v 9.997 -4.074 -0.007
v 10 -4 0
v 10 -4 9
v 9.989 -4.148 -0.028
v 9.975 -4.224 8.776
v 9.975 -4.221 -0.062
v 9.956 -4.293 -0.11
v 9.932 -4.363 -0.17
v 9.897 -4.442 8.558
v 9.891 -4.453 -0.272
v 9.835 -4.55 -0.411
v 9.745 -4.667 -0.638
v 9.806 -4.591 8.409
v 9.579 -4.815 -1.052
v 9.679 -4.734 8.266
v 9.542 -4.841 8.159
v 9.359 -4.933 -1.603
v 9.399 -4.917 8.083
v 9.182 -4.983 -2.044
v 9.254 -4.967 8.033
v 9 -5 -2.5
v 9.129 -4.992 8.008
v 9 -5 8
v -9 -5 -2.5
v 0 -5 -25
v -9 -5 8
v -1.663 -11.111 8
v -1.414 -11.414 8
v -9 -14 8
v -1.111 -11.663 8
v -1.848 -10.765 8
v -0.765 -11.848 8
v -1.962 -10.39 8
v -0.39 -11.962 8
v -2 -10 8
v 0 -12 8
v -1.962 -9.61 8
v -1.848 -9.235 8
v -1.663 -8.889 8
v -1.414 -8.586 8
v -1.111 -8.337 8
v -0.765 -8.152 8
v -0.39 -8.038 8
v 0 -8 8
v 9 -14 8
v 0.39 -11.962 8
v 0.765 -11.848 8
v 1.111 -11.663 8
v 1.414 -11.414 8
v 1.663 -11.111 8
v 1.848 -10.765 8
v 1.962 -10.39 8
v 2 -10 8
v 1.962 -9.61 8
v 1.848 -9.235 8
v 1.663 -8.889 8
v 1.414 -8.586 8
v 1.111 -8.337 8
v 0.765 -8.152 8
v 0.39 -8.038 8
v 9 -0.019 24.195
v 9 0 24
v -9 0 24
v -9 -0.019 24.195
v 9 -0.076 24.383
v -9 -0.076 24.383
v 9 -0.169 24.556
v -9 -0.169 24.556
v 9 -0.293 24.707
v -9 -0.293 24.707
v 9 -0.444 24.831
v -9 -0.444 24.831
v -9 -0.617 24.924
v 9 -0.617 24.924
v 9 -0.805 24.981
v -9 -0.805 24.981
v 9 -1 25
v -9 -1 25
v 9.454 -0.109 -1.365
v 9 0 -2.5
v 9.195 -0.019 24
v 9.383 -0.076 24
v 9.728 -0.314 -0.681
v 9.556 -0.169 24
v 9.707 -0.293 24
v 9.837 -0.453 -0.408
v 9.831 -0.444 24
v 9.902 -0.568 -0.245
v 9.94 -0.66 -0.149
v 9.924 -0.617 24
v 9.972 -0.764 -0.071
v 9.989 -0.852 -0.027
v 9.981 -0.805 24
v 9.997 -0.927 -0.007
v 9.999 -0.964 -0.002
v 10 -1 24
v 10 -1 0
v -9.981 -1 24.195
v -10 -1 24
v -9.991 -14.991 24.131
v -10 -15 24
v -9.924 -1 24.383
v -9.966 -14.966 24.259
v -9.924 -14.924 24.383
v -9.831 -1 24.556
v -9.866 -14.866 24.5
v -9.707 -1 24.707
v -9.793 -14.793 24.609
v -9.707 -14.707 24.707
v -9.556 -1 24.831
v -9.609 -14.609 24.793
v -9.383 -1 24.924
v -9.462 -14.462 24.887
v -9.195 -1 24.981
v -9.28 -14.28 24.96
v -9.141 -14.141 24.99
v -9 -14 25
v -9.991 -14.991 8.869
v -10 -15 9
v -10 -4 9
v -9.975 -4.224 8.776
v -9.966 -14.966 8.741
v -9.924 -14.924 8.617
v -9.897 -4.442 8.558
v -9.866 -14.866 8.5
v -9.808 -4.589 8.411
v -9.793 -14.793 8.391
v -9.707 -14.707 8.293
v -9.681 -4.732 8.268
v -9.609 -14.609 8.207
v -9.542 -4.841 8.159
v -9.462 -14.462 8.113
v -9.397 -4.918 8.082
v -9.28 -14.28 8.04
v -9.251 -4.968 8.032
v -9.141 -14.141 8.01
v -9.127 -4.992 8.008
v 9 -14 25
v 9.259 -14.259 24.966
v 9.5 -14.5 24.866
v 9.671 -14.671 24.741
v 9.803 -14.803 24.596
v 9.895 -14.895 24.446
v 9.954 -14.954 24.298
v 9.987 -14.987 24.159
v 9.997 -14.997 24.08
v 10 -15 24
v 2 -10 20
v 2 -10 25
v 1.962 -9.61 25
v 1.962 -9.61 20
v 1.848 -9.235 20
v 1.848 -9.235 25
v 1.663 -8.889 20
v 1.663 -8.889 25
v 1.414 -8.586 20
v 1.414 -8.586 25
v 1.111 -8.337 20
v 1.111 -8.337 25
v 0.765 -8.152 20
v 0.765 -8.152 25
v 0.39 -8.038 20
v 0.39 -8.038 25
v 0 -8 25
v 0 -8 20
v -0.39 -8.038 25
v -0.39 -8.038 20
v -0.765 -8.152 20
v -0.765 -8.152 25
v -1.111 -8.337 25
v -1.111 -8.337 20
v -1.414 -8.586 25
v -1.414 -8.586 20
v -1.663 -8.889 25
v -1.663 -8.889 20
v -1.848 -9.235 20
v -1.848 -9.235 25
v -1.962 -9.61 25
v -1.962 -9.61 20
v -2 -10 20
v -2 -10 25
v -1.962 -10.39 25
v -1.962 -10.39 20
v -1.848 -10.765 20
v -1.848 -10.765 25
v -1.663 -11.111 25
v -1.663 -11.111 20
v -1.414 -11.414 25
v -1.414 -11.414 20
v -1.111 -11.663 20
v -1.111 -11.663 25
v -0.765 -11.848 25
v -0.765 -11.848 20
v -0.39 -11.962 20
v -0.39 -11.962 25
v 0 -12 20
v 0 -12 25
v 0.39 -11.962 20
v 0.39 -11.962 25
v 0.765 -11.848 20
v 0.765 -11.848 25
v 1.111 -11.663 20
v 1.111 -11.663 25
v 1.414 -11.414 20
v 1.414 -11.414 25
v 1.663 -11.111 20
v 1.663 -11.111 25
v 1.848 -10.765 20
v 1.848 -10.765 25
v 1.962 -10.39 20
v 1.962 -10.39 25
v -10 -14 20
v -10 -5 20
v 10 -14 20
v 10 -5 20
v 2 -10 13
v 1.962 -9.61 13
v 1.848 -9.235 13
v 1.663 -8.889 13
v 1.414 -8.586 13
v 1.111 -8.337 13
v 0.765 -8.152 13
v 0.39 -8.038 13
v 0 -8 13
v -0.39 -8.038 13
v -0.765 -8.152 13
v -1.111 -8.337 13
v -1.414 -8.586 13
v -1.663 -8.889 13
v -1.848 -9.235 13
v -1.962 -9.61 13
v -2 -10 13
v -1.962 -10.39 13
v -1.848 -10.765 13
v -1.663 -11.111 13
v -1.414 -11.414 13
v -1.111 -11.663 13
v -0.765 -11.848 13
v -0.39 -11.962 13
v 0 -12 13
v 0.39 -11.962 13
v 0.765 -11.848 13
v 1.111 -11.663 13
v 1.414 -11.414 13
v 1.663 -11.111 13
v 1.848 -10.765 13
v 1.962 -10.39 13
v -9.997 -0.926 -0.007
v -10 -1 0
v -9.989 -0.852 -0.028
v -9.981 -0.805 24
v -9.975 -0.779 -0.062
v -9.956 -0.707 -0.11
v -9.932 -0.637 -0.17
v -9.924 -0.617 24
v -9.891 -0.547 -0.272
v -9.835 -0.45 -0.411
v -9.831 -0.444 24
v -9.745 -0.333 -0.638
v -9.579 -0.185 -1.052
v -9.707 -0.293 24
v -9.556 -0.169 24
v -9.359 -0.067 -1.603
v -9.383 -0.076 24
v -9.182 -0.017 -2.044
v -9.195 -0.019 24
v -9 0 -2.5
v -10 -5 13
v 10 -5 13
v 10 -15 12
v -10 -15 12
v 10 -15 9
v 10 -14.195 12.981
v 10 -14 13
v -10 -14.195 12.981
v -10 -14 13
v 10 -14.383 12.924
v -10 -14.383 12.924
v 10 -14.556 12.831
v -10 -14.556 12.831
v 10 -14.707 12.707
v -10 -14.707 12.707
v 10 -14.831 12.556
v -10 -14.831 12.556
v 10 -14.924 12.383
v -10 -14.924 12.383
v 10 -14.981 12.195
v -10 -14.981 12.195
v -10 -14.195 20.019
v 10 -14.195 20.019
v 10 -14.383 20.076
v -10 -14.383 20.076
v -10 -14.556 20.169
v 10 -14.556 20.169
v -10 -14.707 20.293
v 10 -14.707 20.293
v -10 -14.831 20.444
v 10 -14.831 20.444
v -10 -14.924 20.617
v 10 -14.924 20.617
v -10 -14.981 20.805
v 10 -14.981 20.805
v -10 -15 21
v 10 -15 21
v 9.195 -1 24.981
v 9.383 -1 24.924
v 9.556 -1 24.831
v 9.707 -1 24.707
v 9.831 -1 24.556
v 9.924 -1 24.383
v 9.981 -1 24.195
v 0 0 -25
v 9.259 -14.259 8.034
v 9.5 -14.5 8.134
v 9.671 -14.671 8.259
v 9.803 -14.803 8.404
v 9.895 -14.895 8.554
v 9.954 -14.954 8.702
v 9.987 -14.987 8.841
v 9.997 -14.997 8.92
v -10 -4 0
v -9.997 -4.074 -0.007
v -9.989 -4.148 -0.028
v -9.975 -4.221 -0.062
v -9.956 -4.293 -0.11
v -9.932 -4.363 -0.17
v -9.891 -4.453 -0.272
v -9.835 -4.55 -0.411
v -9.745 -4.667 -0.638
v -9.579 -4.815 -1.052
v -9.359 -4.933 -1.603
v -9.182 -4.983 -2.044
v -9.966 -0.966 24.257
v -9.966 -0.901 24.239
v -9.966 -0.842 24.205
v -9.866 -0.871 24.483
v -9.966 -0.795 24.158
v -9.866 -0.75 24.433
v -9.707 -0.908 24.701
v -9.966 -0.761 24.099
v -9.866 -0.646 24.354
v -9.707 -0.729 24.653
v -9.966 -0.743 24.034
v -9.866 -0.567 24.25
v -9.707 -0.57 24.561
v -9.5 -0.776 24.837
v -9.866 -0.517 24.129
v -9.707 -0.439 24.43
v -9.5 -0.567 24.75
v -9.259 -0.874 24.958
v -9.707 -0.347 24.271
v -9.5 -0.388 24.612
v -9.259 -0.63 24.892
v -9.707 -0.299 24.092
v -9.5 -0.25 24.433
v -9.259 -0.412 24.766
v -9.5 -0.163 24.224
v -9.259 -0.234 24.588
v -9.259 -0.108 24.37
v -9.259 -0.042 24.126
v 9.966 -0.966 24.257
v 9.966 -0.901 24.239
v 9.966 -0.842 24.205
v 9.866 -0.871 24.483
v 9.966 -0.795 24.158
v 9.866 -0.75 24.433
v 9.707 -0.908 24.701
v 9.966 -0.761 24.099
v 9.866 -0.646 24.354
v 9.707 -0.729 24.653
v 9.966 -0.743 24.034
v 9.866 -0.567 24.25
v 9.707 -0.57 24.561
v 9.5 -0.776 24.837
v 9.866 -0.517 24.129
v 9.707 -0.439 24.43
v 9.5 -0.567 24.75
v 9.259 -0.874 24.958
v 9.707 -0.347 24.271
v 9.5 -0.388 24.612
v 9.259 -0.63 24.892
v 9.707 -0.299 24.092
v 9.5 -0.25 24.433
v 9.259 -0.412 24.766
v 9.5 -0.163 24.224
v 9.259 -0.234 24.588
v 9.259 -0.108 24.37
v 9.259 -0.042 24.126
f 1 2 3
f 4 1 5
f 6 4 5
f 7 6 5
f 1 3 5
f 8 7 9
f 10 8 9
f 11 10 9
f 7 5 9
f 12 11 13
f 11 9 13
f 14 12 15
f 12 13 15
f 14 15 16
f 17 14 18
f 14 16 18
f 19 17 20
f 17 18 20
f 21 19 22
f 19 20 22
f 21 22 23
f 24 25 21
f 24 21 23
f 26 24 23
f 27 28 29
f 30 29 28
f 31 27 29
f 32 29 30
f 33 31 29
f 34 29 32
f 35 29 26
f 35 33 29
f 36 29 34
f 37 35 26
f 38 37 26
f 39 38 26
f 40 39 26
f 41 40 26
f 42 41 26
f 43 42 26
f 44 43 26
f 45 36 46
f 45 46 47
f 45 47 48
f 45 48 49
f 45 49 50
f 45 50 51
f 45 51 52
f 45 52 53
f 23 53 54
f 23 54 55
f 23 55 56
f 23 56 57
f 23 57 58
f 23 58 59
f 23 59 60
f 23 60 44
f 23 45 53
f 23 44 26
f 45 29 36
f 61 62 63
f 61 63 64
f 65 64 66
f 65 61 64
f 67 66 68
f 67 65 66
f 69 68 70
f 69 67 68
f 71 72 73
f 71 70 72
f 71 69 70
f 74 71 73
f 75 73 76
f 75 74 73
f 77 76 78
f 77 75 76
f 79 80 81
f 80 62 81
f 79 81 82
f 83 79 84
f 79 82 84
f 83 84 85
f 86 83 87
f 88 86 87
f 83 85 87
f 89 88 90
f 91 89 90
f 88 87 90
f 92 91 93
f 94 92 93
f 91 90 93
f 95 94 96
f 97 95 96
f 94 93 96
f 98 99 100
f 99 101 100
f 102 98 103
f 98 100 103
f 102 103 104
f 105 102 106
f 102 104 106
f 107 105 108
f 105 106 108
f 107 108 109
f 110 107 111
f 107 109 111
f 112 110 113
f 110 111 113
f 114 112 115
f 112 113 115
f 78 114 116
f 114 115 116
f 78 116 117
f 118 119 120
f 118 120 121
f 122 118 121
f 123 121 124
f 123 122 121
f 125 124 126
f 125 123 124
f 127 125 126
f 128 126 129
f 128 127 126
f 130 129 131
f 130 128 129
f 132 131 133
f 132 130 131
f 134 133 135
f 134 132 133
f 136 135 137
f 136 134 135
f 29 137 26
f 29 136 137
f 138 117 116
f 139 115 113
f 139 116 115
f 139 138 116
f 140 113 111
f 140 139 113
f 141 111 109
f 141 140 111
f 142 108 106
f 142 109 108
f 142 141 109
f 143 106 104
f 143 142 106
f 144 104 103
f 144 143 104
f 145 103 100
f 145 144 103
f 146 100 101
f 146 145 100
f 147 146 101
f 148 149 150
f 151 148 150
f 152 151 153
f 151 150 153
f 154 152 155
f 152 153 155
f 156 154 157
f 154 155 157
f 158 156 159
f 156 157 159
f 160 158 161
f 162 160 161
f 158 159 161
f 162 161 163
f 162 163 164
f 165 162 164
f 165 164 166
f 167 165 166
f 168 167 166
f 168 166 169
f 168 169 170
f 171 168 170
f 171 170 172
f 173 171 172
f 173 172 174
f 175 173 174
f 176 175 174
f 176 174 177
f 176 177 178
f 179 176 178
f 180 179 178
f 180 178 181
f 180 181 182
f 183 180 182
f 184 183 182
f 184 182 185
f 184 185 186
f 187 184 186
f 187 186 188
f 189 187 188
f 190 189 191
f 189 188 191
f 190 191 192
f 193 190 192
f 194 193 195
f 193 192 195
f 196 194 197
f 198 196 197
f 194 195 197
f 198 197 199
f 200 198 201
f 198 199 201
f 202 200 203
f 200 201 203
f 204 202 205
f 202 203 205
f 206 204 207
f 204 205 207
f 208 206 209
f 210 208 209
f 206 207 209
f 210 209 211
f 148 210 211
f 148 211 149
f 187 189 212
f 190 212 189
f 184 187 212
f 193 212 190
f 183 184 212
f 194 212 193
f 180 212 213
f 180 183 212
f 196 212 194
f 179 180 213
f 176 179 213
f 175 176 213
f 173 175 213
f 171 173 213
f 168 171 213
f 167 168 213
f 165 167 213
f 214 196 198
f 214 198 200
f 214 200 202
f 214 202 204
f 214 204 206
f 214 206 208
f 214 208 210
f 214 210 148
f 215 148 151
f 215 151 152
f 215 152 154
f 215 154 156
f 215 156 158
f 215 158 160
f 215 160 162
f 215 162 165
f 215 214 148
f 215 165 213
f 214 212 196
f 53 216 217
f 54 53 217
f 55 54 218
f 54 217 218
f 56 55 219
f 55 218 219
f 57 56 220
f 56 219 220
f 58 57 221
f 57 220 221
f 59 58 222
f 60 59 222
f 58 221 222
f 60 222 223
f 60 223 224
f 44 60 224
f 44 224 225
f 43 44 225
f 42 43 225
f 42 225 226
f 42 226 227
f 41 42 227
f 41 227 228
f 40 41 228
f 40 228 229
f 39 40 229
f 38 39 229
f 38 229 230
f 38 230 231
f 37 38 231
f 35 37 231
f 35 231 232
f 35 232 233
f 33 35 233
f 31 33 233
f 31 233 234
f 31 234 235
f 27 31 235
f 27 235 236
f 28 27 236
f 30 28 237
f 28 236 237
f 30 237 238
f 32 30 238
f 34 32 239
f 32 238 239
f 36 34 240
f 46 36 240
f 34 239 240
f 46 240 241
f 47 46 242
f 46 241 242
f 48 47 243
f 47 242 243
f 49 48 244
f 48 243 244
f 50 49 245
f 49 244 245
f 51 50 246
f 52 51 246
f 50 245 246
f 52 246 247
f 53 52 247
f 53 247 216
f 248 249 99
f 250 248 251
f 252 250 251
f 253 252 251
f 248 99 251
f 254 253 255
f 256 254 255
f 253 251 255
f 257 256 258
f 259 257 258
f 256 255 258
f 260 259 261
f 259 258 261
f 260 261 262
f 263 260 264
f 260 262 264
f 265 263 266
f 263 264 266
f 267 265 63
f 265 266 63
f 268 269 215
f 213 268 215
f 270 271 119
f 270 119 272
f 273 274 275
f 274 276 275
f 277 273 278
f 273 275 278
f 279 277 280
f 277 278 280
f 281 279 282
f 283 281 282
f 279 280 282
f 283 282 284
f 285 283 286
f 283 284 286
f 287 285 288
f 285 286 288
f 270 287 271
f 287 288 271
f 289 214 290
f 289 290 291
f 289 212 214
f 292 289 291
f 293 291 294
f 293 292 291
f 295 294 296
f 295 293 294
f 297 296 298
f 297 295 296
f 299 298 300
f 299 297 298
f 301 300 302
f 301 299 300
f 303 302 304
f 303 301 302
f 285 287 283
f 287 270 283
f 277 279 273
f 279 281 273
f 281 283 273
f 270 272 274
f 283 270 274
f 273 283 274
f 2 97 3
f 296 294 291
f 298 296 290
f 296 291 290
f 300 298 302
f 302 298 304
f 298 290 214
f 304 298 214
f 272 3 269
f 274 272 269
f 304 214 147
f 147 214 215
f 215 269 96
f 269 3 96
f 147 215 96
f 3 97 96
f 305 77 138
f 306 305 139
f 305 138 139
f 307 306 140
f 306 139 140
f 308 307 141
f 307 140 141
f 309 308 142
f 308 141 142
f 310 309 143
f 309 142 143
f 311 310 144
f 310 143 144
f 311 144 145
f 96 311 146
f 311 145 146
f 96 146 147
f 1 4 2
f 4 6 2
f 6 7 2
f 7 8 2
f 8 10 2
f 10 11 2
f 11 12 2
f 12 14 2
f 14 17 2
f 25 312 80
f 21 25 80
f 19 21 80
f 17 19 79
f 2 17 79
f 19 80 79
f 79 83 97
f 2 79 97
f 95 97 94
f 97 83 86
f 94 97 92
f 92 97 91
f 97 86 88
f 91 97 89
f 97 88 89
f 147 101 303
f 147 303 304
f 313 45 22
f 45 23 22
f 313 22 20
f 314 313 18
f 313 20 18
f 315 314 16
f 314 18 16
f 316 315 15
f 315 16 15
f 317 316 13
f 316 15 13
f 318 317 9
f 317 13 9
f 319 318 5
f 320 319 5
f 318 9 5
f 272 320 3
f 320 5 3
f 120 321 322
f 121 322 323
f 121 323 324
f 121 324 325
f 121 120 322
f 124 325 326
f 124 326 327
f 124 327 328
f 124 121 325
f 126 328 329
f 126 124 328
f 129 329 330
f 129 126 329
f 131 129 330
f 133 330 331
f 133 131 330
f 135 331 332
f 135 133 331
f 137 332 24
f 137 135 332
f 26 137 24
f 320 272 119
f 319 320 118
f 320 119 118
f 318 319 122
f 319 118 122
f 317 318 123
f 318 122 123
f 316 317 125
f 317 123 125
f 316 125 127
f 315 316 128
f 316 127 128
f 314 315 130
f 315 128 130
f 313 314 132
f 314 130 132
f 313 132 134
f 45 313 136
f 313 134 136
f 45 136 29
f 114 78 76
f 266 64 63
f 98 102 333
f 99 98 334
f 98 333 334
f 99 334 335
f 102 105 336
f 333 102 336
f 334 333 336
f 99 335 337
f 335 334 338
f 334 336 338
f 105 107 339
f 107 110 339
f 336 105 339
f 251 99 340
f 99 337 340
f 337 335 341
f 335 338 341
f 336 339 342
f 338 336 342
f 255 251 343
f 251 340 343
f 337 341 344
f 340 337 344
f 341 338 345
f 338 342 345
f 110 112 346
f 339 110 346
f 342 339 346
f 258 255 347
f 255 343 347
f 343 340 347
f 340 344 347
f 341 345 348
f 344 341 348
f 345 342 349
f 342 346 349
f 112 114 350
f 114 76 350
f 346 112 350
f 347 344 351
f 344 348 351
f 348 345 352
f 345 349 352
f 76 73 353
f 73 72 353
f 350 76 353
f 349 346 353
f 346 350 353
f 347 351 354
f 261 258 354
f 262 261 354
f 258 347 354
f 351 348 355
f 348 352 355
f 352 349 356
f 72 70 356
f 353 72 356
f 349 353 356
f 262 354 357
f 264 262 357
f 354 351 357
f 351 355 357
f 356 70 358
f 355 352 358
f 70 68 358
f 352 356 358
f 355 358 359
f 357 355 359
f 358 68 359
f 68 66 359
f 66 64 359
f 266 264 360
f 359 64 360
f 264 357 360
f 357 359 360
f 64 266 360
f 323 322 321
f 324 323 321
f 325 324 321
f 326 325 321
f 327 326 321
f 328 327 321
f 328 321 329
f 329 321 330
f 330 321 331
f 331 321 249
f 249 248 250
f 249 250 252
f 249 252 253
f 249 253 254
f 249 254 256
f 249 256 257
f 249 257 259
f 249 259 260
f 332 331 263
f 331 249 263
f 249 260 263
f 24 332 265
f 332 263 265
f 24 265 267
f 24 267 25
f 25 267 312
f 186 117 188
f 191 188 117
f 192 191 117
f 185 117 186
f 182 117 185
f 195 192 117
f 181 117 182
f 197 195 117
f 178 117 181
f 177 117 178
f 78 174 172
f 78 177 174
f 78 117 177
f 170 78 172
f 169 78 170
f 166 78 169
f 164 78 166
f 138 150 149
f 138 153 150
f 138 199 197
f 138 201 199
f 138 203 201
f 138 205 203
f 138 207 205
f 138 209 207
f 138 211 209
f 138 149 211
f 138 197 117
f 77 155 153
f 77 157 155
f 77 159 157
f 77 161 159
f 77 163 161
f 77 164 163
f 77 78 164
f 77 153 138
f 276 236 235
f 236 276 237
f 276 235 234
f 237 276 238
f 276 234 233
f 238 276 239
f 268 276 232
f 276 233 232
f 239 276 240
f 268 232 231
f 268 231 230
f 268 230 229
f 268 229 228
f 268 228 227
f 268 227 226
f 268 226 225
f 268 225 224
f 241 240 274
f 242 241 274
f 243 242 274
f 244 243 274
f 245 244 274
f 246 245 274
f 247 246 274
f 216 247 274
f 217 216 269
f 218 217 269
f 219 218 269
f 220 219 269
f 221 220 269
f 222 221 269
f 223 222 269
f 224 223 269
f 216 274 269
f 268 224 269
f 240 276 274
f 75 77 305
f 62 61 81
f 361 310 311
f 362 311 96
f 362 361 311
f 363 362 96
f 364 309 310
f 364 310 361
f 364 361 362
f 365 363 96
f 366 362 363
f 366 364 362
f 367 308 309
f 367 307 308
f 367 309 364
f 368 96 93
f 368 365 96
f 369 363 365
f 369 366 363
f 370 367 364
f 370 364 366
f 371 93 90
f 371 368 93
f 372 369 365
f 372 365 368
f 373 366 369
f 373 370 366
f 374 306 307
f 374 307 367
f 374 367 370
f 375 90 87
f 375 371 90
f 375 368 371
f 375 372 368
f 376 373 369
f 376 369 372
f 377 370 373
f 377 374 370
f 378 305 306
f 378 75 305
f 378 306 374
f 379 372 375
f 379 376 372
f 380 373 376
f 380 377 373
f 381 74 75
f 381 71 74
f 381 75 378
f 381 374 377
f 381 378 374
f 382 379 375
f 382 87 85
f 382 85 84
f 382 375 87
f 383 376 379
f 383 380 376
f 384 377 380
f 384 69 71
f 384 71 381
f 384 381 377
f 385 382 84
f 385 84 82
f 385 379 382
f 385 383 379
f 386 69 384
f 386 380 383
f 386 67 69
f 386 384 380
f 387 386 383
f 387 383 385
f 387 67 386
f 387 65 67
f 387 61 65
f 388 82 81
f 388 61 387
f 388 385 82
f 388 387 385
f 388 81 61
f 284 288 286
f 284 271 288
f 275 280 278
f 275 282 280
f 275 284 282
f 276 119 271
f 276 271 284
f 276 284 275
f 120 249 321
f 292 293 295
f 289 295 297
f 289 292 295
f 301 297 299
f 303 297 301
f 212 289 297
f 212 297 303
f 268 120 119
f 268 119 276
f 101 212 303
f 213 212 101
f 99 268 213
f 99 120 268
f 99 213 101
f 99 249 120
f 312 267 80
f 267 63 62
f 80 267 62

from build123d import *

# Parameters (mm, degrees)
F0_W     = 20
F0_H     = 50
F1_DEPTH = 15
F2_W     = 10
F2_H     = 7
F2_H_2   = 33
F3_DEPTH = 20.001
F5_DEPTH = 15.001
F6_R     = 2
F7_DEPTH = 50.001
F8_R     = 1
F9_R     = 0.99999


# Not quite as in the source:
# - a fillet or chamfer is up to 0.001 mm smaller than in the source, because OpenCascade refuses the exact size


with BuildPart() as f1:
    # F0 (on Front) → F1 (new body)
    with BuildSketch(Plane.XZ):
        Rectangle(F0_W, F0_H)
    extrude(amount=F1_DEPTH)

    # F2 (on face) → F3 (cut, through all)
    with BuildSketch(Plane.YZ.offset(10)):
        with Locations((-10, 16.5)):
            Rectangle(F2_W, F2_H)
        with Locations((-10, -8.5)):
            Rectangle(F2_W, F2_H_2)
    extrude(amount=-F3_DEPTH, mode=Mode.SUBTRACT)

    # F4 (on face) → F5 (cut, through all)
    with BuildSketch(Plane(origin=(0, 0, 0), x_dir=(-1, 0, 0), z_dir=(0, 1, 0))):
        Polygon((0, -25), (-10, 0), (-10, -25), align=None)
        Polygon((10, 0), (0, -25), (10, -25), align=None)
    extrude(amount=-F5_DEPTH, mode=Mode.SUBTRACT)

    # F6 (on face) → F7 (cut, through all)
    with BuildSketch(Plane.XY.offset(25)):
        with Locations((0, -10)):
            Circle(F6_R)
    extrude(amount=-F7_DEPTH, mode=Mode.SUBTRACT)

    # F8
    f8_edges = [f1.edges().sort_by_distance(p)[0] for p in [
        (0, 0, 25),
        (10, -7.5, 25),
        (-10, -7.5, 25),
        (0, -15, 25),
        (10, 0, 12.5),
        (-10, 0, 12.5),
        (-10, -10, 8),
        (10, -10, 8),
        (0, -15, 8),
    ]]
    fillet(f8_edges, radius=F8_R)

    # F9 (radius 1 in the source; OpenCascade refuses exactly that, so slightly less here)
    f9_edges = [f1.edges().sort_by_distance(p)[0] for p in [
        (0, -15, 13),
        (0, -15, 20),
        (-10, -5, 4),
        (10, -5, 4),
    ]]
    fillet(f9_edges, radius=F9_R)


solid = f1.part
